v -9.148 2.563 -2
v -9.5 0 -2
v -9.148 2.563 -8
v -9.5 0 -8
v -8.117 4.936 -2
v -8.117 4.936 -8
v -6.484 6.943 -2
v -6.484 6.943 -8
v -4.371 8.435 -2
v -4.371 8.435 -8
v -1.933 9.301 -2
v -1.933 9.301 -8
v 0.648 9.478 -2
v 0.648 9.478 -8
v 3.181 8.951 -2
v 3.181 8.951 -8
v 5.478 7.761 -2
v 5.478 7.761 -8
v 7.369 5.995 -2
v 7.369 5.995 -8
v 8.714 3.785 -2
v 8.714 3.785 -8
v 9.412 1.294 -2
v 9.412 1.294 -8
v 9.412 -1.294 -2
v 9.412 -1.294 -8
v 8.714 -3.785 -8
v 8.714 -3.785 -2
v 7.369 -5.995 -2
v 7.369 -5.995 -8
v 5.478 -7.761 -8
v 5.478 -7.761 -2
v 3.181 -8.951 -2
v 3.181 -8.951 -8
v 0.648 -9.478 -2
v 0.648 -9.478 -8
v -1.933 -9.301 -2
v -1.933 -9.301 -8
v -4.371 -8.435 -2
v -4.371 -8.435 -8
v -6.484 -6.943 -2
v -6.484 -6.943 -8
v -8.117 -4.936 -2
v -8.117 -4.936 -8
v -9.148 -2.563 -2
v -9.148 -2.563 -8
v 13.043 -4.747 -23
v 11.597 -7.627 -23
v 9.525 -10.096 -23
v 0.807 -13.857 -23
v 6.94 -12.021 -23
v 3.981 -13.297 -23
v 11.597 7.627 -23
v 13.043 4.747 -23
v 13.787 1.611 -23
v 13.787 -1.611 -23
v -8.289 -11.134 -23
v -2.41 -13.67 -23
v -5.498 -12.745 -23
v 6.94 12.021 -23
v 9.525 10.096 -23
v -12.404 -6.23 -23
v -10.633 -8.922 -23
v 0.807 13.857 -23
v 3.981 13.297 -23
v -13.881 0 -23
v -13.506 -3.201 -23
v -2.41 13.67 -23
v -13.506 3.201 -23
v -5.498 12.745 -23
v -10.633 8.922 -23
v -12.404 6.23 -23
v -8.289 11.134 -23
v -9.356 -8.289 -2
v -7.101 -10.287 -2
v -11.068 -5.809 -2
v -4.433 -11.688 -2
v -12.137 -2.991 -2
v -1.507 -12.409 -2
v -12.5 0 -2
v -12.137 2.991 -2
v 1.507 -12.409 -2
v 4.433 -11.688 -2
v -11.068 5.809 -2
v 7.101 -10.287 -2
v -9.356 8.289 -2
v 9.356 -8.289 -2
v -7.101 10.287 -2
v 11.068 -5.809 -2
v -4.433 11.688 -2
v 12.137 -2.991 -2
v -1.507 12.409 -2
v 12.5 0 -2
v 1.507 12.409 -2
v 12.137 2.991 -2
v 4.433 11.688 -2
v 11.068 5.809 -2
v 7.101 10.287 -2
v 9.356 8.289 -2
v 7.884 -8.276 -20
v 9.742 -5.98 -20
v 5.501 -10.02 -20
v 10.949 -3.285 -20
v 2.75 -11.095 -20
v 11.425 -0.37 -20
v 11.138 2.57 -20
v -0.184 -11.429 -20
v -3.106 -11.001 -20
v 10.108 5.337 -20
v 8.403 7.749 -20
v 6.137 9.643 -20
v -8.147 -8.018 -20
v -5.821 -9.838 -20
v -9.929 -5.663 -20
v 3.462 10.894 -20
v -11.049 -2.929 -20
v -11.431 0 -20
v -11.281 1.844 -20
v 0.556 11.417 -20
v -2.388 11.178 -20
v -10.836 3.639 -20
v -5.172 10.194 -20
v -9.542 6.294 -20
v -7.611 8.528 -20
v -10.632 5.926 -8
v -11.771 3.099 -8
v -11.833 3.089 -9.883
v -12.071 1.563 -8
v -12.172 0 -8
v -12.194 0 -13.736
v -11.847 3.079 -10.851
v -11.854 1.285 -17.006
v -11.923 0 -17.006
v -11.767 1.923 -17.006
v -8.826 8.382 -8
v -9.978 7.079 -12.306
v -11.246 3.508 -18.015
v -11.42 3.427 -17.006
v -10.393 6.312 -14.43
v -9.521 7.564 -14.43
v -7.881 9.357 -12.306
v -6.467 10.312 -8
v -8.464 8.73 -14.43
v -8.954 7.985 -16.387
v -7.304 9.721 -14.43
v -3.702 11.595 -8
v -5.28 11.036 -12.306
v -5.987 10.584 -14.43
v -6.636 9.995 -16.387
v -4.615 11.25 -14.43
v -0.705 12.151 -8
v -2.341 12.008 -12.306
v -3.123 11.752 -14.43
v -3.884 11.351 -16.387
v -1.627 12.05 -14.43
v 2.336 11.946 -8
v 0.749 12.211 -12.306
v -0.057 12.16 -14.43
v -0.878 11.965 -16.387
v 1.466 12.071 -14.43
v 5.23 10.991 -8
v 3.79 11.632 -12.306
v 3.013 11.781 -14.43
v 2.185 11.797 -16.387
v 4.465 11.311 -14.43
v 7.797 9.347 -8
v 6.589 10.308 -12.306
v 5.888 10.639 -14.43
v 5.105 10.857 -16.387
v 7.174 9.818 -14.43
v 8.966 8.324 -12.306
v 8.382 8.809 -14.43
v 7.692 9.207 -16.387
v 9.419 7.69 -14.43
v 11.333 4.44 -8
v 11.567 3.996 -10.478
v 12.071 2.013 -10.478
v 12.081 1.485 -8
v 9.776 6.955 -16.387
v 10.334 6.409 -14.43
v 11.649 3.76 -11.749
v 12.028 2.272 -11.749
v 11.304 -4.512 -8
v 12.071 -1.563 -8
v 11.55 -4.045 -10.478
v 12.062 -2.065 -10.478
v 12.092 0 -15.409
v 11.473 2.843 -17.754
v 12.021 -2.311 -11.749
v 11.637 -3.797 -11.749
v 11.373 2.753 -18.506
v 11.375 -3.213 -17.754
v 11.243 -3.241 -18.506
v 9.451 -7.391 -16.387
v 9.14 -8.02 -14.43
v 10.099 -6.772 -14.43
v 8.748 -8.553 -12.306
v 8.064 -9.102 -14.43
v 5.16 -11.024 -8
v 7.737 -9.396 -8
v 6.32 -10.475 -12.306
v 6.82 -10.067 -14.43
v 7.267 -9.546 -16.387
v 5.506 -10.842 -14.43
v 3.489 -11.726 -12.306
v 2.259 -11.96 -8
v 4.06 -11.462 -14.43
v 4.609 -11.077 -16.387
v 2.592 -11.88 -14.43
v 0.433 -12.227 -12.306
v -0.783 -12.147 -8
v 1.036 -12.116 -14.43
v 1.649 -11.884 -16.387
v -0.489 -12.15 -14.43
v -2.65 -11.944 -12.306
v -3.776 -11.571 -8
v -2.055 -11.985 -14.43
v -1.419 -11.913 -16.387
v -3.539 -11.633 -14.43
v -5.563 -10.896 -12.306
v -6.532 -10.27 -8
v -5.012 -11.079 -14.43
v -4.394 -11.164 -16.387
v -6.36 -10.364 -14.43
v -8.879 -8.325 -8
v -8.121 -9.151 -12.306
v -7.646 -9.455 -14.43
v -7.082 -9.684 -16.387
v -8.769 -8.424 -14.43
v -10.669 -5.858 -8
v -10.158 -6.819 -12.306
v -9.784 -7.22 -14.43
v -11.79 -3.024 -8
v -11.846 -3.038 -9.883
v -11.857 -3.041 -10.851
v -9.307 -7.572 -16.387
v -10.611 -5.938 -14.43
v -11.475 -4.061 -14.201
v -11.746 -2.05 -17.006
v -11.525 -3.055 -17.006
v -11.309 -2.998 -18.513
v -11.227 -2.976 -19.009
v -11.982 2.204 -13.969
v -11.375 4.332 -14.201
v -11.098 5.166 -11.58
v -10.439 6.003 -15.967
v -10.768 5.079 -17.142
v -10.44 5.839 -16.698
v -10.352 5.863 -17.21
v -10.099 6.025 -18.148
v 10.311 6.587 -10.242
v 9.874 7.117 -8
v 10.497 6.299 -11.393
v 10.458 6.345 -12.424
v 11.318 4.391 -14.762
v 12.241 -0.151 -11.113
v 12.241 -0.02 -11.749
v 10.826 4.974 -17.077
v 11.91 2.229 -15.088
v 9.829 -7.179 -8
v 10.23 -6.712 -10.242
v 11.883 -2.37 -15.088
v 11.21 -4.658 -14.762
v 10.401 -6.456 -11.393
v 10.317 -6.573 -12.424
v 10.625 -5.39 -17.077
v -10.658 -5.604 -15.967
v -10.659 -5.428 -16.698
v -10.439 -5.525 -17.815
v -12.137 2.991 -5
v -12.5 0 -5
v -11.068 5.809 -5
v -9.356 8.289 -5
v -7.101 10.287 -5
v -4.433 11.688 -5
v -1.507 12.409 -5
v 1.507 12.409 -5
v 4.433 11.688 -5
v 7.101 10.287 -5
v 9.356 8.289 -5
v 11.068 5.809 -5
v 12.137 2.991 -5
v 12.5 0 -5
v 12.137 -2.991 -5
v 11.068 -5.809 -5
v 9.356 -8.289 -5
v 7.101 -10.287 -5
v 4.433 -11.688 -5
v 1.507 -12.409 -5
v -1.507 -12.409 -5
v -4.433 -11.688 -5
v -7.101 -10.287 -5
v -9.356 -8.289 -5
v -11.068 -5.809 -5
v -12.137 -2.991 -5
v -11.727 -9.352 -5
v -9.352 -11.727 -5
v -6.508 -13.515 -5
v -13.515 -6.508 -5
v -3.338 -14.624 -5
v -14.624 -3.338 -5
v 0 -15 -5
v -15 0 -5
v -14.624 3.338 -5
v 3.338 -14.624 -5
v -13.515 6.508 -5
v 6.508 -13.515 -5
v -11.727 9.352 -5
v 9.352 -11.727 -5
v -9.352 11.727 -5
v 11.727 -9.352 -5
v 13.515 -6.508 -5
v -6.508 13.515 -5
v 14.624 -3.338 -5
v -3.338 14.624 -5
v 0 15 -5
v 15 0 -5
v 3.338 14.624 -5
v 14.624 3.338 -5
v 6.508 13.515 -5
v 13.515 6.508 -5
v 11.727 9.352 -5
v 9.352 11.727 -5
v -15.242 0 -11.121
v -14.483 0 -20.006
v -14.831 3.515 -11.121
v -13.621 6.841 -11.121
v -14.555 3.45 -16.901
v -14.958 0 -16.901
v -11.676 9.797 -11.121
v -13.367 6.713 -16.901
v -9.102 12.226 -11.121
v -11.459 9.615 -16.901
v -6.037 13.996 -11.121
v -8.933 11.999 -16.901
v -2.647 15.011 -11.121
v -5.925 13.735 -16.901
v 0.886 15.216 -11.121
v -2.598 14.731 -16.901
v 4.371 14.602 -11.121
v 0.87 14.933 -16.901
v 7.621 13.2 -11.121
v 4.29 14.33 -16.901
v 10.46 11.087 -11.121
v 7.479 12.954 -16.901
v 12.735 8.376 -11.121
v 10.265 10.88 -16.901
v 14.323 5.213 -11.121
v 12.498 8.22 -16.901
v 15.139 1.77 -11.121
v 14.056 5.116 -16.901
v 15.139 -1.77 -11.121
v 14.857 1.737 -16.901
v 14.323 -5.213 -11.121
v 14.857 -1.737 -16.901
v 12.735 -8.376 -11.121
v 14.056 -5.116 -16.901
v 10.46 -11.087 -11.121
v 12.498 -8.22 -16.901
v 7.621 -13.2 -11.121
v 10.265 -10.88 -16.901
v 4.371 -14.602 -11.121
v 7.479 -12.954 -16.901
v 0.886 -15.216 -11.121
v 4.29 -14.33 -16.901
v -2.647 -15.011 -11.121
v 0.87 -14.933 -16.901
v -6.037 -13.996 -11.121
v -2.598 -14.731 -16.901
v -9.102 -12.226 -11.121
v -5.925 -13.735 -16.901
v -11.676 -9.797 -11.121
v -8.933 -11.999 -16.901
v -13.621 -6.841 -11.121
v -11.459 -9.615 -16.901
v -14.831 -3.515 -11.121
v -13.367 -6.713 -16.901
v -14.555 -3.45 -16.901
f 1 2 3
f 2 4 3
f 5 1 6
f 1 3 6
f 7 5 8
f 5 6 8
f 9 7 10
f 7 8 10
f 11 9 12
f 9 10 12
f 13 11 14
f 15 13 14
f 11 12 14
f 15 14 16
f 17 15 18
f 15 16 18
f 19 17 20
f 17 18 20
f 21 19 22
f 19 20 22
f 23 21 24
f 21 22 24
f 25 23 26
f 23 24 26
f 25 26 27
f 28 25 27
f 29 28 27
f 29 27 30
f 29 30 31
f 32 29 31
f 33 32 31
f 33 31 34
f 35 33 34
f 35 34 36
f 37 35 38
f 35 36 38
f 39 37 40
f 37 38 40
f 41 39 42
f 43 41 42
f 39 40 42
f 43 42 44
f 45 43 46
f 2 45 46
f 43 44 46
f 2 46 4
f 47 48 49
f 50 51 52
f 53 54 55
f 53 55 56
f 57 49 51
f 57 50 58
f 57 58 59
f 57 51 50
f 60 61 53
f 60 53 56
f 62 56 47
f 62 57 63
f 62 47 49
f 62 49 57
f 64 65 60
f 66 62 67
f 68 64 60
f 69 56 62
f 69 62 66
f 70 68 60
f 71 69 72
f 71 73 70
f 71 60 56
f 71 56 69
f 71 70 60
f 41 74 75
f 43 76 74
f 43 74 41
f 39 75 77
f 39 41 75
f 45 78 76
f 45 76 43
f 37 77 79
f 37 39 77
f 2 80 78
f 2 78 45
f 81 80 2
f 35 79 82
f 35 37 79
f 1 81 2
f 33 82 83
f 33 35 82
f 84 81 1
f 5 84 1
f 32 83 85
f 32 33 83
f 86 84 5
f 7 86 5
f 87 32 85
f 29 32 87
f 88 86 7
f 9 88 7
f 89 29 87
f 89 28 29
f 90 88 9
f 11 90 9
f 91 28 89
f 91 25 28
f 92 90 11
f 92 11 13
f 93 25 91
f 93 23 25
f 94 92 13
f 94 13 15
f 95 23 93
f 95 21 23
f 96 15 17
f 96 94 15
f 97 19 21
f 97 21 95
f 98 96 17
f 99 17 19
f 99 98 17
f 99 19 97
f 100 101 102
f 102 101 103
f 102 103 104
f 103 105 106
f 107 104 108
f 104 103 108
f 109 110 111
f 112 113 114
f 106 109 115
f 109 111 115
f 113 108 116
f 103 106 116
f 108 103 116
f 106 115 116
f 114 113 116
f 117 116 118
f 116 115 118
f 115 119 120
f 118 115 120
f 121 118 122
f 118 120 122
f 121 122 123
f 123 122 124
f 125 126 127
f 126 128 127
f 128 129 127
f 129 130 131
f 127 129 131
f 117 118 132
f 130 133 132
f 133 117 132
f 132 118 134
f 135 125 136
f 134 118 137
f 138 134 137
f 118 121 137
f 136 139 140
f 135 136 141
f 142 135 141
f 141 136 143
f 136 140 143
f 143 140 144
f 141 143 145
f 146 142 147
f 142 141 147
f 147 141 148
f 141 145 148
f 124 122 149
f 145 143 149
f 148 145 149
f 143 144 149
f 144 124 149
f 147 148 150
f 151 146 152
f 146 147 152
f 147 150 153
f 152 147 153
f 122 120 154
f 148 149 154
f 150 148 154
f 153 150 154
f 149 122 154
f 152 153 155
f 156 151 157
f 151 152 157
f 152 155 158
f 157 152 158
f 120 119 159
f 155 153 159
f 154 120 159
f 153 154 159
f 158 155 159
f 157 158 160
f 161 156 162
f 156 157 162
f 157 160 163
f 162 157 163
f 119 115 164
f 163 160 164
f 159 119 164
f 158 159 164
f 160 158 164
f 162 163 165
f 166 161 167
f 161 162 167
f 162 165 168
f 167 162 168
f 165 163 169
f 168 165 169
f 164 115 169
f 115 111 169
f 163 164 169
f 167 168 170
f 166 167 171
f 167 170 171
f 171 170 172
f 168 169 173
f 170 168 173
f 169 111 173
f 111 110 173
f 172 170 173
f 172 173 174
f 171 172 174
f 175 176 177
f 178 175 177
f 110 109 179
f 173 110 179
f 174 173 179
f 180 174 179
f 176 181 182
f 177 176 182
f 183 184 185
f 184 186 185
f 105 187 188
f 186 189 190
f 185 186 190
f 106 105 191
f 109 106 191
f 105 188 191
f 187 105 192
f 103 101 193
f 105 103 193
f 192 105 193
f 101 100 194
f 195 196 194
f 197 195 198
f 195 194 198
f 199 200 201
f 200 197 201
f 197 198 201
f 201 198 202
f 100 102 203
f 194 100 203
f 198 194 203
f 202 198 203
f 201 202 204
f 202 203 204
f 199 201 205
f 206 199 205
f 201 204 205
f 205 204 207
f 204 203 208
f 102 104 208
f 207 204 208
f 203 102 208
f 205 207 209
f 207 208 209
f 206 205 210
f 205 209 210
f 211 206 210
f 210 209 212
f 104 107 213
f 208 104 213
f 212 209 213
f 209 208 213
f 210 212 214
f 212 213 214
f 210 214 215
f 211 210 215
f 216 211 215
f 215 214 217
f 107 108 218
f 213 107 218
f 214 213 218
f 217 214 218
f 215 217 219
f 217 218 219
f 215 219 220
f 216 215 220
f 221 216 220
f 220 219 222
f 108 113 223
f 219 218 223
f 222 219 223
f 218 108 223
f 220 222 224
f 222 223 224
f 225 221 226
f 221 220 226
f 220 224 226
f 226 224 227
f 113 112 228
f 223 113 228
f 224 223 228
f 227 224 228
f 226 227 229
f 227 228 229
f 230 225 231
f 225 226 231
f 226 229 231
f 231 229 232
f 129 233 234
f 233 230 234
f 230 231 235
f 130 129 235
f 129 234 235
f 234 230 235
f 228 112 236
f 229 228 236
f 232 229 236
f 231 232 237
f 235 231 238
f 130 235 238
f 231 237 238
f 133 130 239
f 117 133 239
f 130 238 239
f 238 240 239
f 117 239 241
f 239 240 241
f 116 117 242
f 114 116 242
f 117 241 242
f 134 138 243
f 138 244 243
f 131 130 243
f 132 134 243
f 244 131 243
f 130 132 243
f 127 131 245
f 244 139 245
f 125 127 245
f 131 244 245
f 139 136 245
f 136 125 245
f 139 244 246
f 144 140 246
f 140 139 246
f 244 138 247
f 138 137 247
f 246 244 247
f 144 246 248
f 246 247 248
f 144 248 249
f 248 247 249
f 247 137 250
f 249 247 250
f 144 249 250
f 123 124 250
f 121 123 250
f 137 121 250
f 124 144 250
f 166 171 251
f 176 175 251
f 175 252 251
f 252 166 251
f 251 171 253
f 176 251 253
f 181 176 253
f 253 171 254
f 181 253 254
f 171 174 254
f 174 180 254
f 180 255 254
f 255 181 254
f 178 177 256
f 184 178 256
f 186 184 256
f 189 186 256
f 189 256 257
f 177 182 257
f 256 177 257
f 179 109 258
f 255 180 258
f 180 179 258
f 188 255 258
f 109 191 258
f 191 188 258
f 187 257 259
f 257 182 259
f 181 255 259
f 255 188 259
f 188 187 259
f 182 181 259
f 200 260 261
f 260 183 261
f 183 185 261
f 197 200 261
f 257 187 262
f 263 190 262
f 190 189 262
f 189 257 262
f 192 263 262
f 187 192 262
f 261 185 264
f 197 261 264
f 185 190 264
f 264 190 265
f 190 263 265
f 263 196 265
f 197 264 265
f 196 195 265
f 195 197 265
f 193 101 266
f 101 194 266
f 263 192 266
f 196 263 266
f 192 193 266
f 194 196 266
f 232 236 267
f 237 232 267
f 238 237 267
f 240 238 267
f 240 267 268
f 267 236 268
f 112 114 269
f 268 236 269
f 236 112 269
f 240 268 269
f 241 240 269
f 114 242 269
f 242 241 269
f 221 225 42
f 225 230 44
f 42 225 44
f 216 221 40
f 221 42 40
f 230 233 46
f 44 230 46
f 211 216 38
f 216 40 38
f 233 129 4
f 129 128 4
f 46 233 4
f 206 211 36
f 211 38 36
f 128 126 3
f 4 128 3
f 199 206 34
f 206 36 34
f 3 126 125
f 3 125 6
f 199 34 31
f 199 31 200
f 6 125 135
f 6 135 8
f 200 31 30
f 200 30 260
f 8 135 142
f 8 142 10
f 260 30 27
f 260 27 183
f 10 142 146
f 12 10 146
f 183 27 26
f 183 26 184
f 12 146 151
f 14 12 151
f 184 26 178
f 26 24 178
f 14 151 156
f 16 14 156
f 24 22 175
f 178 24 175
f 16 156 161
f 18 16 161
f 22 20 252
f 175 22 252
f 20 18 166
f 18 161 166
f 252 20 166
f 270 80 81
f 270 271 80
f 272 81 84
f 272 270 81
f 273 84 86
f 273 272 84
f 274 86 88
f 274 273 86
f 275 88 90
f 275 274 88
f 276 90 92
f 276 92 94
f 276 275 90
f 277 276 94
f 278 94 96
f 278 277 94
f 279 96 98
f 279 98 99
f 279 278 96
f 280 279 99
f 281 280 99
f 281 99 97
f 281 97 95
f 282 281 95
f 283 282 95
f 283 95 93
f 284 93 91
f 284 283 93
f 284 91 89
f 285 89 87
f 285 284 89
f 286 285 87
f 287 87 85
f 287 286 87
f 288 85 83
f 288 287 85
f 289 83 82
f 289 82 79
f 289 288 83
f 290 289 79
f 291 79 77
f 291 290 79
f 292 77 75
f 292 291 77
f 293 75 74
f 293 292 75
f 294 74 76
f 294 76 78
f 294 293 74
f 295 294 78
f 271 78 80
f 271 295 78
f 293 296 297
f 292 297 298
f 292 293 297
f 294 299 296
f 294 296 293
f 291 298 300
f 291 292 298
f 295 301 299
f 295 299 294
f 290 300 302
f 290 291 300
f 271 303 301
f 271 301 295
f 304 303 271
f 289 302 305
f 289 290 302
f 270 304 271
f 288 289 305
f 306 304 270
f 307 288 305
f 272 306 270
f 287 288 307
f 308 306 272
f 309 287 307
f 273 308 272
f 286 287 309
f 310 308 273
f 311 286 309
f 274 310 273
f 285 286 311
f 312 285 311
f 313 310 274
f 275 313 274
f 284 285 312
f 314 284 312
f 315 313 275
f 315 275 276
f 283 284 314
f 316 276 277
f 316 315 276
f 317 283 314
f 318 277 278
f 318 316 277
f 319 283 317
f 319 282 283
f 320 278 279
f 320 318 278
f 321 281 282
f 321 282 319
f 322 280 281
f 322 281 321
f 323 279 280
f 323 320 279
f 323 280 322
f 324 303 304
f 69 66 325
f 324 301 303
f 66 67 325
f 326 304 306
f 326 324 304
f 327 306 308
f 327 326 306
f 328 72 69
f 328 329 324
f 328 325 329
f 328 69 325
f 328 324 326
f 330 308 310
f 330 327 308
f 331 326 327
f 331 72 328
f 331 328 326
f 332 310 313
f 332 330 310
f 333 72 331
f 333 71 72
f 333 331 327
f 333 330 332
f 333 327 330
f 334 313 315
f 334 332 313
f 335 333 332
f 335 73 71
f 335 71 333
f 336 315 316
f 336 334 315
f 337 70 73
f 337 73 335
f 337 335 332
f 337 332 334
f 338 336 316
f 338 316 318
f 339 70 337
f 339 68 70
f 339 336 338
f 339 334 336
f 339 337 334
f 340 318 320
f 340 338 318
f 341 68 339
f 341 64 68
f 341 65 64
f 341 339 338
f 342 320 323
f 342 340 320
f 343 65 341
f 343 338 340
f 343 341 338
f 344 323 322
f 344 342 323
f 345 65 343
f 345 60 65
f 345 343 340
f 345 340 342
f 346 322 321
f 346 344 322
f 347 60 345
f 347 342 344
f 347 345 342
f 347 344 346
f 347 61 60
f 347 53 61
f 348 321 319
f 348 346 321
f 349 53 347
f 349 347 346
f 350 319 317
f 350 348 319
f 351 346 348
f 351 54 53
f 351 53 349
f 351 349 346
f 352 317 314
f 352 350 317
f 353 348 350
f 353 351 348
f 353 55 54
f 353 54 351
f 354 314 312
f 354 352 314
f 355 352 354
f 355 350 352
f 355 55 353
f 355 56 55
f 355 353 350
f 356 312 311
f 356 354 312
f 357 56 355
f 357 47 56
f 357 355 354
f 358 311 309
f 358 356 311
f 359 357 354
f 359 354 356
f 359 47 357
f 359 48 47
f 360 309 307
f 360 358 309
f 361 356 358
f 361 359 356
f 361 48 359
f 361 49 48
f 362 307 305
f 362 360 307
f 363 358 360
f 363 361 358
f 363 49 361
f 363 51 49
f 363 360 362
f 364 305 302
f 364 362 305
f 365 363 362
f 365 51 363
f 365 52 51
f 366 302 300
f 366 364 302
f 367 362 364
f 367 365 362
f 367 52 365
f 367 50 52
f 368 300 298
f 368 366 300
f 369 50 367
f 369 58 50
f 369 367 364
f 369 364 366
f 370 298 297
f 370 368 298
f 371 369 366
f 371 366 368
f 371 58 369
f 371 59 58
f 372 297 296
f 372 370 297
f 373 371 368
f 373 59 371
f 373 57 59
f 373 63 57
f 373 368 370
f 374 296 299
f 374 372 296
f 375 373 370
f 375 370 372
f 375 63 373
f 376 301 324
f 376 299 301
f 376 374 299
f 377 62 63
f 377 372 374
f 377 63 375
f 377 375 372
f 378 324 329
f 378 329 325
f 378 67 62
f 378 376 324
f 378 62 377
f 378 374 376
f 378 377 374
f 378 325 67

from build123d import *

# Parameters (mm, degrees)
F3_T = -3


# Not quite as in the source:
# - a feature of the source that left no trace in its solid (it failed there, or was rolled back) is left out


with BuildPart() as f2:
    # F1 (on face) → F2 (revolve)
    with BuildSketch(Plane.XZ):
        with BuildLine():
            Line((-12.5, -5), (-15, -5))
            add(Edge.make_bspline(
                [(-15, -5), (-15.2242291382, -7.9082660222), (-15.4829896575, -15.4302819777), (-14.3790599241, -20.605744182), (-13.8805727597, -23)],
                knots=[0.0395283873, 0.0395283873, 0.0395283873, 0.0395283873, 0.5201151217, 0.8906255687, 0.8906255687, 0.8906255687, 0.8906255687], degree=3))
            Line((-13.8805727597, -23), (0, -23))
            Line((0, -23), (0, -2))
            Line((0, -2), (-12.5, -2))
            Line((-12.5, -2), (-12.5, -5))
        make_face()
    revolve(axis=Axis((0, 0, -13.5), (0, 0, -1)))

    # F3
    f3_openings = [f2.faces().sort_by_distance(p)[0] for p in [
        (0, 0, -2),
    ]]
    offset(amount=F3_T, openings=f3_openings, kind=Kind.INTERSECTION)


solid = f2.part
